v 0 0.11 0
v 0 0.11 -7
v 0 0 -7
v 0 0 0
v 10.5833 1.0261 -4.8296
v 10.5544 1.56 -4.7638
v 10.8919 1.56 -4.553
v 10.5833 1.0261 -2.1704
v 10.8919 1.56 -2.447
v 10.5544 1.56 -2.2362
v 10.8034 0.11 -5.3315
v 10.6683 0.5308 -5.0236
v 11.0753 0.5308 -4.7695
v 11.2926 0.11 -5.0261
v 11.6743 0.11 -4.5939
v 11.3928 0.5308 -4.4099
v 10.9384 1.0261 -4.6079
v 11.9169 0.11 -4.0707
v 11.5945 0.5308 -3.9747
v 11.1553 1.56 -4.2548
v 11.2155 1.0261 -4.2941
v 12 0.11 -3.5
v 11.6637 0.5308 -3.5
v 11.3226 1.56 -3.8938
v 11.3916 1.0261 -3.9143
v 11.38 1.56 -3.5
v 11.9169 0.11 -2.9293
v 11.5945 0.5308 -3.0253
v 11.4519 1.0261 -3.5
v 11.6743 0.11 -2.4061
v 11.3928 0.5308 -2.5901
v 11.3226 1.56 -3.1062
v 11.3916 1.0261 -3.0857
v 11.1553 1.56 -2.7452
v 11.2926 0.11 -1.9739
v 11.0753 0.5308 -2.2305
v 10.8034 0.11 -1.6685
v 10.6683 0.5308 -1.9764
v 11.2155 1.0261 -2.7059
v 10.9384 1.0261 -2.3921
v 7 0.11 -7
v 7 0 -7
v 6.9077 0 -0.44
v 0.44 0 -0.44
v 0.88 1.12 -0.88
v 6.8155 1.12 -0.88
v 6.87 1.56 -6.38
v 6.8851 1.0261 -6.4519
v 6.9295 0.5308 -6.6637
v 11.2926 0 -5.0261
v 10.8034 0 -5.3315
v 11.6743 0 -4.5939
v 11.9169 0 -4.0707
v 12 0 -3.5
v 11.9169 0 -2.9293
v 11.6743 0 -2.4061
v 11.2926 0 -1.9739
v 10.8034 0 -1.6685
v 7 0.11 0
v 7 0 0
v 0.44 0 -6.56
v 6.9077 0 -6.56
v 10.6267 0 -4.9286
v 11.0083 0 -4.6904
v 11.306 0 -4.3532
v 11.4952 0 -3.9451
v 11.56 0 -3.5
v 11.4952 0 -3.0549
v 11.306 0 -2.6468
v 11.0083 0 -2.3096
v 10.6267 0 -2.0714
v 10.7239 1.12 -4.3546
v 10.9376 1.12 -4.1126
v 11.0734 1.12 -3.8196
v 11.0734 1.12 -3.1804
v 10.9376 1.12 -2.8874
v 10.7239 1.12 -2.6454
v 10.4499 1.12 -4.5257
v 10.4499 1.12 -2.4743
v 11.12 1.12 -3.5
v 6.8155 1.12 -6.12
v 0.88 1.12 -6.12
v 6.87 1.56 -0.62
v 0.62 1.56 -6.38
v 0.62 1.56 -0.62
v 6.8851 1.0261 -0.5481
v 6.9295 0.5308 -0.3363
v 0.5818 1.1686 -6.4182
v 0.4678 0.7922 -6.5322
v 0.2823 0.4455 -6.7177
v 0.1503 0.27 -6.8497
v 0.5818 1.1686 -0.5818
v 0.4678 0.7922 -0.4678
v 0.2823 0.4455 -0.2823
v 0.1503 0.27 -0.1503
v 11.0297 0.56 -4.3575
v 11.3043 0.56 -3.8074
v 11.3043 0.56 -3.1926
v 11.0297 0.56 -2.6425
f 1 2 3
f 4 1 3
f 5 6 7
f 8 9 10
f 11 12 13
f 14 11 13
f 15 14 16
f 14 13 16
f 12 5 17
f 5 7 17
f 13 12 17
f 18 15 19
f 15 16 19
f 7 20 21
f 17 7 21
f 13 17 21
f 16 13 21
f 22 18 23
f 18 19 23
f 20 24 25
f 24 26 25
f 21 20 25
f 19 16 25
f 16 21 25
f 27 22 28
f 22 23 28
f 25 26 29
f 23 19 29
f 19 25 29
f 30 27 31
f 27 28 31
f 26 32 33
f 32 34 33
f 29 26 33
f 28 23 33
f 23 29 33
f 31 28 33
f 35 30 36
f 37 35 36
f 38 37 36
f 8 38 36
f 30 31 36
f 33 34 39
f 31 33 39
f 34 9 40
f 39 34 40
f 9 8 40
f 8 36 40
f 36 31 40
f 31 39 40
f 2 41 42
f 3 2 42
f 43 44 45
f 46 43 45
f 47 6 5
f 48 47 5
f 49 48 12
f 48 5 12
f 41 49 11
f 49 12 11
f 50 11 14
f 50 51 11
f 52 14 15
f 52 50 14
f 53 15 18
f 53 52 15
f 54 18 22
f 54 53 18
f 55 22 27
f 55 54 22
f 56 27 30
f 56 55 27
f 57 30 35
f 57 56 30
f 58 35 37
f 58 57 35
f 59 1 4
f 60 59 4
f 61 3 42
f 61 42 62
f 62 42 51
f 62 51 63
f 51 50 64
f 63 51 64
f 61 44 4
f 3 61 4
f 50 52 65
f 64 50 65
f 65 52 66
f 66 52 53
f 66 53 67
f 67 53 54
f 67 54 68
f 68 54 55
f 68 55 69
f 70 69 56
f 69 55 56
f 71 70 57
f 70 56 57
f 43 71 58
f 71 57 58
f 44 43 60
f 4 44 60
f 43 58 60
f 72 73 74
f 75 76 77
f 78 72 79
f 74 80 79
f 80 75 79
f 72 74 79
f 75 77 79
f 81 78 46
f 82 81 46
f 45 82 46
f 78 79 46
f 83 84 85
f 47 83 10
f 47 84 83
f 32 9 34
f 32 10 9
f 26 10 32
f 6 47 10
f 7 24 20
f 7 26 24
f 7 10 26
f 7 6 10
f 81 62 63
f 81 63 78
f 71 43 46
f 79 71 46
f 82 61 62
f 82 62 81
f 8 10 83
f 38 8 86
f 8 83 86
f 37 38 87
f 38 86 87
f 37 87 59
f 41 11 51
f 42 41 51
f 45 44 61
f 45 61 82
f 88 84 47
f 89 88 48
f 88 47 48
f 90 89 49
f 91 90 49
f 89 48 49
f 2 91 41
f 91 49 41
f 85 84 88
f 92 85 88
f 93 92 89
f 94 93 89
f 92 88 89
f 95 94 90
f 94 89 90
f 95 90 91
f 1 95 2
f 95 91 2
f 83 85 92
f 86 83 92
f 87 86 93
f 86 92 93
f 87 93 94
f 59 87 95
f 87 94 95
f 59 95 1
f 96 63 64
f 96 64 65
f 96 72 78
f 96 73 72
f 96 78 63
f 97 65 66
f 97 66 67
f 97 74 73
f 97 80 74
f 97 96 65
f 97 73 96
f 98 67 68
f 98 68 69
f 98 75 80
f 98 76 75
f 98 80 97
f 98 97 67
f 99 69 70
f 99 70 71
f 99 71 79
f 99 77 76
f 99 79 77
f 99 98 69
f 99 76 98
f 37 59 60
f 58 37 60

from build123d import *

# Parameters (mm, degrees)
BOSS_EXTRUDE1_DEPTH = 0.44


with BuildPart() as part:
    # Sweep2: sweep along a path in Sketch1
    with BuildLine(Plane(origin=(0, 0, 0), x_dir=(1, 0, 0), z_dir=(0, 1, 0))) as sweep2_path:
        Line((7, 7), (10.80344393, 5.331523369))
        ThreePointArc((10.80344393, 5.331523369), (12, 3.5), (10.80344393, 1.668476631))
        Line((10.80344393, 1.668476631), (7, 0))
        Line((7, 0), (0, 0))
        Line((0, 0), (0, 7))
        Line((0, 7), (7, 7))
    # Sketch2 → Sweep2 (sweep)
    with BuildSketch(Plane(origin=(0, 0, 0), x_dir=(0, 0, -1), z_dir=(1, 0, 0))):
        with BuildLine():
            Line((0, 0), (0, 0.11))
            ThreePointArc((0, 0.11), (0.458946824, 0.771312392), (0.62, 1.56))
            Line((0.62, 1.56), (1.88, 1.56))
            Line((1.88, 1.56), (1.88, 1.12))
            Line((1.88, 1.12), (0.88, 1.12))
            Line((0.88, 1.12), (0.44, 0))
            Line((0.44, 0), (0, 0))
        make_face()
    sweep(path=sweep2_path.line, transition=Transition.RIGHT)

    # Sketch9 → Boss-Extrude1 (add)
    with BuildSketch(Plane(origin=(0, 1.56, 0), x_dir=(1, 0, 0), z_dir=(0, 1, 0))):
        with BuildLine():
            Line((6.605777013, 1.88), (10.048206636, 3.390108598))
            ThreePointArc((10.048206636, 3.390108598), (10.12, 3.5), (10.048206636, 3.609891402))
            Line((10.048206636, 3.609891402), (6.605777013, 5.12))
            Line((6.605777013, 5.12), (1.88, 5.12))
            Line((1.88, 5.12), (1.88, 1.88))
            Line((1.88, 1.88), (6.605777013, 1.88))
        make_face()
    extrude(amount=-BOSS_EXTRUDE1_DEPTH)


solid = part.part
